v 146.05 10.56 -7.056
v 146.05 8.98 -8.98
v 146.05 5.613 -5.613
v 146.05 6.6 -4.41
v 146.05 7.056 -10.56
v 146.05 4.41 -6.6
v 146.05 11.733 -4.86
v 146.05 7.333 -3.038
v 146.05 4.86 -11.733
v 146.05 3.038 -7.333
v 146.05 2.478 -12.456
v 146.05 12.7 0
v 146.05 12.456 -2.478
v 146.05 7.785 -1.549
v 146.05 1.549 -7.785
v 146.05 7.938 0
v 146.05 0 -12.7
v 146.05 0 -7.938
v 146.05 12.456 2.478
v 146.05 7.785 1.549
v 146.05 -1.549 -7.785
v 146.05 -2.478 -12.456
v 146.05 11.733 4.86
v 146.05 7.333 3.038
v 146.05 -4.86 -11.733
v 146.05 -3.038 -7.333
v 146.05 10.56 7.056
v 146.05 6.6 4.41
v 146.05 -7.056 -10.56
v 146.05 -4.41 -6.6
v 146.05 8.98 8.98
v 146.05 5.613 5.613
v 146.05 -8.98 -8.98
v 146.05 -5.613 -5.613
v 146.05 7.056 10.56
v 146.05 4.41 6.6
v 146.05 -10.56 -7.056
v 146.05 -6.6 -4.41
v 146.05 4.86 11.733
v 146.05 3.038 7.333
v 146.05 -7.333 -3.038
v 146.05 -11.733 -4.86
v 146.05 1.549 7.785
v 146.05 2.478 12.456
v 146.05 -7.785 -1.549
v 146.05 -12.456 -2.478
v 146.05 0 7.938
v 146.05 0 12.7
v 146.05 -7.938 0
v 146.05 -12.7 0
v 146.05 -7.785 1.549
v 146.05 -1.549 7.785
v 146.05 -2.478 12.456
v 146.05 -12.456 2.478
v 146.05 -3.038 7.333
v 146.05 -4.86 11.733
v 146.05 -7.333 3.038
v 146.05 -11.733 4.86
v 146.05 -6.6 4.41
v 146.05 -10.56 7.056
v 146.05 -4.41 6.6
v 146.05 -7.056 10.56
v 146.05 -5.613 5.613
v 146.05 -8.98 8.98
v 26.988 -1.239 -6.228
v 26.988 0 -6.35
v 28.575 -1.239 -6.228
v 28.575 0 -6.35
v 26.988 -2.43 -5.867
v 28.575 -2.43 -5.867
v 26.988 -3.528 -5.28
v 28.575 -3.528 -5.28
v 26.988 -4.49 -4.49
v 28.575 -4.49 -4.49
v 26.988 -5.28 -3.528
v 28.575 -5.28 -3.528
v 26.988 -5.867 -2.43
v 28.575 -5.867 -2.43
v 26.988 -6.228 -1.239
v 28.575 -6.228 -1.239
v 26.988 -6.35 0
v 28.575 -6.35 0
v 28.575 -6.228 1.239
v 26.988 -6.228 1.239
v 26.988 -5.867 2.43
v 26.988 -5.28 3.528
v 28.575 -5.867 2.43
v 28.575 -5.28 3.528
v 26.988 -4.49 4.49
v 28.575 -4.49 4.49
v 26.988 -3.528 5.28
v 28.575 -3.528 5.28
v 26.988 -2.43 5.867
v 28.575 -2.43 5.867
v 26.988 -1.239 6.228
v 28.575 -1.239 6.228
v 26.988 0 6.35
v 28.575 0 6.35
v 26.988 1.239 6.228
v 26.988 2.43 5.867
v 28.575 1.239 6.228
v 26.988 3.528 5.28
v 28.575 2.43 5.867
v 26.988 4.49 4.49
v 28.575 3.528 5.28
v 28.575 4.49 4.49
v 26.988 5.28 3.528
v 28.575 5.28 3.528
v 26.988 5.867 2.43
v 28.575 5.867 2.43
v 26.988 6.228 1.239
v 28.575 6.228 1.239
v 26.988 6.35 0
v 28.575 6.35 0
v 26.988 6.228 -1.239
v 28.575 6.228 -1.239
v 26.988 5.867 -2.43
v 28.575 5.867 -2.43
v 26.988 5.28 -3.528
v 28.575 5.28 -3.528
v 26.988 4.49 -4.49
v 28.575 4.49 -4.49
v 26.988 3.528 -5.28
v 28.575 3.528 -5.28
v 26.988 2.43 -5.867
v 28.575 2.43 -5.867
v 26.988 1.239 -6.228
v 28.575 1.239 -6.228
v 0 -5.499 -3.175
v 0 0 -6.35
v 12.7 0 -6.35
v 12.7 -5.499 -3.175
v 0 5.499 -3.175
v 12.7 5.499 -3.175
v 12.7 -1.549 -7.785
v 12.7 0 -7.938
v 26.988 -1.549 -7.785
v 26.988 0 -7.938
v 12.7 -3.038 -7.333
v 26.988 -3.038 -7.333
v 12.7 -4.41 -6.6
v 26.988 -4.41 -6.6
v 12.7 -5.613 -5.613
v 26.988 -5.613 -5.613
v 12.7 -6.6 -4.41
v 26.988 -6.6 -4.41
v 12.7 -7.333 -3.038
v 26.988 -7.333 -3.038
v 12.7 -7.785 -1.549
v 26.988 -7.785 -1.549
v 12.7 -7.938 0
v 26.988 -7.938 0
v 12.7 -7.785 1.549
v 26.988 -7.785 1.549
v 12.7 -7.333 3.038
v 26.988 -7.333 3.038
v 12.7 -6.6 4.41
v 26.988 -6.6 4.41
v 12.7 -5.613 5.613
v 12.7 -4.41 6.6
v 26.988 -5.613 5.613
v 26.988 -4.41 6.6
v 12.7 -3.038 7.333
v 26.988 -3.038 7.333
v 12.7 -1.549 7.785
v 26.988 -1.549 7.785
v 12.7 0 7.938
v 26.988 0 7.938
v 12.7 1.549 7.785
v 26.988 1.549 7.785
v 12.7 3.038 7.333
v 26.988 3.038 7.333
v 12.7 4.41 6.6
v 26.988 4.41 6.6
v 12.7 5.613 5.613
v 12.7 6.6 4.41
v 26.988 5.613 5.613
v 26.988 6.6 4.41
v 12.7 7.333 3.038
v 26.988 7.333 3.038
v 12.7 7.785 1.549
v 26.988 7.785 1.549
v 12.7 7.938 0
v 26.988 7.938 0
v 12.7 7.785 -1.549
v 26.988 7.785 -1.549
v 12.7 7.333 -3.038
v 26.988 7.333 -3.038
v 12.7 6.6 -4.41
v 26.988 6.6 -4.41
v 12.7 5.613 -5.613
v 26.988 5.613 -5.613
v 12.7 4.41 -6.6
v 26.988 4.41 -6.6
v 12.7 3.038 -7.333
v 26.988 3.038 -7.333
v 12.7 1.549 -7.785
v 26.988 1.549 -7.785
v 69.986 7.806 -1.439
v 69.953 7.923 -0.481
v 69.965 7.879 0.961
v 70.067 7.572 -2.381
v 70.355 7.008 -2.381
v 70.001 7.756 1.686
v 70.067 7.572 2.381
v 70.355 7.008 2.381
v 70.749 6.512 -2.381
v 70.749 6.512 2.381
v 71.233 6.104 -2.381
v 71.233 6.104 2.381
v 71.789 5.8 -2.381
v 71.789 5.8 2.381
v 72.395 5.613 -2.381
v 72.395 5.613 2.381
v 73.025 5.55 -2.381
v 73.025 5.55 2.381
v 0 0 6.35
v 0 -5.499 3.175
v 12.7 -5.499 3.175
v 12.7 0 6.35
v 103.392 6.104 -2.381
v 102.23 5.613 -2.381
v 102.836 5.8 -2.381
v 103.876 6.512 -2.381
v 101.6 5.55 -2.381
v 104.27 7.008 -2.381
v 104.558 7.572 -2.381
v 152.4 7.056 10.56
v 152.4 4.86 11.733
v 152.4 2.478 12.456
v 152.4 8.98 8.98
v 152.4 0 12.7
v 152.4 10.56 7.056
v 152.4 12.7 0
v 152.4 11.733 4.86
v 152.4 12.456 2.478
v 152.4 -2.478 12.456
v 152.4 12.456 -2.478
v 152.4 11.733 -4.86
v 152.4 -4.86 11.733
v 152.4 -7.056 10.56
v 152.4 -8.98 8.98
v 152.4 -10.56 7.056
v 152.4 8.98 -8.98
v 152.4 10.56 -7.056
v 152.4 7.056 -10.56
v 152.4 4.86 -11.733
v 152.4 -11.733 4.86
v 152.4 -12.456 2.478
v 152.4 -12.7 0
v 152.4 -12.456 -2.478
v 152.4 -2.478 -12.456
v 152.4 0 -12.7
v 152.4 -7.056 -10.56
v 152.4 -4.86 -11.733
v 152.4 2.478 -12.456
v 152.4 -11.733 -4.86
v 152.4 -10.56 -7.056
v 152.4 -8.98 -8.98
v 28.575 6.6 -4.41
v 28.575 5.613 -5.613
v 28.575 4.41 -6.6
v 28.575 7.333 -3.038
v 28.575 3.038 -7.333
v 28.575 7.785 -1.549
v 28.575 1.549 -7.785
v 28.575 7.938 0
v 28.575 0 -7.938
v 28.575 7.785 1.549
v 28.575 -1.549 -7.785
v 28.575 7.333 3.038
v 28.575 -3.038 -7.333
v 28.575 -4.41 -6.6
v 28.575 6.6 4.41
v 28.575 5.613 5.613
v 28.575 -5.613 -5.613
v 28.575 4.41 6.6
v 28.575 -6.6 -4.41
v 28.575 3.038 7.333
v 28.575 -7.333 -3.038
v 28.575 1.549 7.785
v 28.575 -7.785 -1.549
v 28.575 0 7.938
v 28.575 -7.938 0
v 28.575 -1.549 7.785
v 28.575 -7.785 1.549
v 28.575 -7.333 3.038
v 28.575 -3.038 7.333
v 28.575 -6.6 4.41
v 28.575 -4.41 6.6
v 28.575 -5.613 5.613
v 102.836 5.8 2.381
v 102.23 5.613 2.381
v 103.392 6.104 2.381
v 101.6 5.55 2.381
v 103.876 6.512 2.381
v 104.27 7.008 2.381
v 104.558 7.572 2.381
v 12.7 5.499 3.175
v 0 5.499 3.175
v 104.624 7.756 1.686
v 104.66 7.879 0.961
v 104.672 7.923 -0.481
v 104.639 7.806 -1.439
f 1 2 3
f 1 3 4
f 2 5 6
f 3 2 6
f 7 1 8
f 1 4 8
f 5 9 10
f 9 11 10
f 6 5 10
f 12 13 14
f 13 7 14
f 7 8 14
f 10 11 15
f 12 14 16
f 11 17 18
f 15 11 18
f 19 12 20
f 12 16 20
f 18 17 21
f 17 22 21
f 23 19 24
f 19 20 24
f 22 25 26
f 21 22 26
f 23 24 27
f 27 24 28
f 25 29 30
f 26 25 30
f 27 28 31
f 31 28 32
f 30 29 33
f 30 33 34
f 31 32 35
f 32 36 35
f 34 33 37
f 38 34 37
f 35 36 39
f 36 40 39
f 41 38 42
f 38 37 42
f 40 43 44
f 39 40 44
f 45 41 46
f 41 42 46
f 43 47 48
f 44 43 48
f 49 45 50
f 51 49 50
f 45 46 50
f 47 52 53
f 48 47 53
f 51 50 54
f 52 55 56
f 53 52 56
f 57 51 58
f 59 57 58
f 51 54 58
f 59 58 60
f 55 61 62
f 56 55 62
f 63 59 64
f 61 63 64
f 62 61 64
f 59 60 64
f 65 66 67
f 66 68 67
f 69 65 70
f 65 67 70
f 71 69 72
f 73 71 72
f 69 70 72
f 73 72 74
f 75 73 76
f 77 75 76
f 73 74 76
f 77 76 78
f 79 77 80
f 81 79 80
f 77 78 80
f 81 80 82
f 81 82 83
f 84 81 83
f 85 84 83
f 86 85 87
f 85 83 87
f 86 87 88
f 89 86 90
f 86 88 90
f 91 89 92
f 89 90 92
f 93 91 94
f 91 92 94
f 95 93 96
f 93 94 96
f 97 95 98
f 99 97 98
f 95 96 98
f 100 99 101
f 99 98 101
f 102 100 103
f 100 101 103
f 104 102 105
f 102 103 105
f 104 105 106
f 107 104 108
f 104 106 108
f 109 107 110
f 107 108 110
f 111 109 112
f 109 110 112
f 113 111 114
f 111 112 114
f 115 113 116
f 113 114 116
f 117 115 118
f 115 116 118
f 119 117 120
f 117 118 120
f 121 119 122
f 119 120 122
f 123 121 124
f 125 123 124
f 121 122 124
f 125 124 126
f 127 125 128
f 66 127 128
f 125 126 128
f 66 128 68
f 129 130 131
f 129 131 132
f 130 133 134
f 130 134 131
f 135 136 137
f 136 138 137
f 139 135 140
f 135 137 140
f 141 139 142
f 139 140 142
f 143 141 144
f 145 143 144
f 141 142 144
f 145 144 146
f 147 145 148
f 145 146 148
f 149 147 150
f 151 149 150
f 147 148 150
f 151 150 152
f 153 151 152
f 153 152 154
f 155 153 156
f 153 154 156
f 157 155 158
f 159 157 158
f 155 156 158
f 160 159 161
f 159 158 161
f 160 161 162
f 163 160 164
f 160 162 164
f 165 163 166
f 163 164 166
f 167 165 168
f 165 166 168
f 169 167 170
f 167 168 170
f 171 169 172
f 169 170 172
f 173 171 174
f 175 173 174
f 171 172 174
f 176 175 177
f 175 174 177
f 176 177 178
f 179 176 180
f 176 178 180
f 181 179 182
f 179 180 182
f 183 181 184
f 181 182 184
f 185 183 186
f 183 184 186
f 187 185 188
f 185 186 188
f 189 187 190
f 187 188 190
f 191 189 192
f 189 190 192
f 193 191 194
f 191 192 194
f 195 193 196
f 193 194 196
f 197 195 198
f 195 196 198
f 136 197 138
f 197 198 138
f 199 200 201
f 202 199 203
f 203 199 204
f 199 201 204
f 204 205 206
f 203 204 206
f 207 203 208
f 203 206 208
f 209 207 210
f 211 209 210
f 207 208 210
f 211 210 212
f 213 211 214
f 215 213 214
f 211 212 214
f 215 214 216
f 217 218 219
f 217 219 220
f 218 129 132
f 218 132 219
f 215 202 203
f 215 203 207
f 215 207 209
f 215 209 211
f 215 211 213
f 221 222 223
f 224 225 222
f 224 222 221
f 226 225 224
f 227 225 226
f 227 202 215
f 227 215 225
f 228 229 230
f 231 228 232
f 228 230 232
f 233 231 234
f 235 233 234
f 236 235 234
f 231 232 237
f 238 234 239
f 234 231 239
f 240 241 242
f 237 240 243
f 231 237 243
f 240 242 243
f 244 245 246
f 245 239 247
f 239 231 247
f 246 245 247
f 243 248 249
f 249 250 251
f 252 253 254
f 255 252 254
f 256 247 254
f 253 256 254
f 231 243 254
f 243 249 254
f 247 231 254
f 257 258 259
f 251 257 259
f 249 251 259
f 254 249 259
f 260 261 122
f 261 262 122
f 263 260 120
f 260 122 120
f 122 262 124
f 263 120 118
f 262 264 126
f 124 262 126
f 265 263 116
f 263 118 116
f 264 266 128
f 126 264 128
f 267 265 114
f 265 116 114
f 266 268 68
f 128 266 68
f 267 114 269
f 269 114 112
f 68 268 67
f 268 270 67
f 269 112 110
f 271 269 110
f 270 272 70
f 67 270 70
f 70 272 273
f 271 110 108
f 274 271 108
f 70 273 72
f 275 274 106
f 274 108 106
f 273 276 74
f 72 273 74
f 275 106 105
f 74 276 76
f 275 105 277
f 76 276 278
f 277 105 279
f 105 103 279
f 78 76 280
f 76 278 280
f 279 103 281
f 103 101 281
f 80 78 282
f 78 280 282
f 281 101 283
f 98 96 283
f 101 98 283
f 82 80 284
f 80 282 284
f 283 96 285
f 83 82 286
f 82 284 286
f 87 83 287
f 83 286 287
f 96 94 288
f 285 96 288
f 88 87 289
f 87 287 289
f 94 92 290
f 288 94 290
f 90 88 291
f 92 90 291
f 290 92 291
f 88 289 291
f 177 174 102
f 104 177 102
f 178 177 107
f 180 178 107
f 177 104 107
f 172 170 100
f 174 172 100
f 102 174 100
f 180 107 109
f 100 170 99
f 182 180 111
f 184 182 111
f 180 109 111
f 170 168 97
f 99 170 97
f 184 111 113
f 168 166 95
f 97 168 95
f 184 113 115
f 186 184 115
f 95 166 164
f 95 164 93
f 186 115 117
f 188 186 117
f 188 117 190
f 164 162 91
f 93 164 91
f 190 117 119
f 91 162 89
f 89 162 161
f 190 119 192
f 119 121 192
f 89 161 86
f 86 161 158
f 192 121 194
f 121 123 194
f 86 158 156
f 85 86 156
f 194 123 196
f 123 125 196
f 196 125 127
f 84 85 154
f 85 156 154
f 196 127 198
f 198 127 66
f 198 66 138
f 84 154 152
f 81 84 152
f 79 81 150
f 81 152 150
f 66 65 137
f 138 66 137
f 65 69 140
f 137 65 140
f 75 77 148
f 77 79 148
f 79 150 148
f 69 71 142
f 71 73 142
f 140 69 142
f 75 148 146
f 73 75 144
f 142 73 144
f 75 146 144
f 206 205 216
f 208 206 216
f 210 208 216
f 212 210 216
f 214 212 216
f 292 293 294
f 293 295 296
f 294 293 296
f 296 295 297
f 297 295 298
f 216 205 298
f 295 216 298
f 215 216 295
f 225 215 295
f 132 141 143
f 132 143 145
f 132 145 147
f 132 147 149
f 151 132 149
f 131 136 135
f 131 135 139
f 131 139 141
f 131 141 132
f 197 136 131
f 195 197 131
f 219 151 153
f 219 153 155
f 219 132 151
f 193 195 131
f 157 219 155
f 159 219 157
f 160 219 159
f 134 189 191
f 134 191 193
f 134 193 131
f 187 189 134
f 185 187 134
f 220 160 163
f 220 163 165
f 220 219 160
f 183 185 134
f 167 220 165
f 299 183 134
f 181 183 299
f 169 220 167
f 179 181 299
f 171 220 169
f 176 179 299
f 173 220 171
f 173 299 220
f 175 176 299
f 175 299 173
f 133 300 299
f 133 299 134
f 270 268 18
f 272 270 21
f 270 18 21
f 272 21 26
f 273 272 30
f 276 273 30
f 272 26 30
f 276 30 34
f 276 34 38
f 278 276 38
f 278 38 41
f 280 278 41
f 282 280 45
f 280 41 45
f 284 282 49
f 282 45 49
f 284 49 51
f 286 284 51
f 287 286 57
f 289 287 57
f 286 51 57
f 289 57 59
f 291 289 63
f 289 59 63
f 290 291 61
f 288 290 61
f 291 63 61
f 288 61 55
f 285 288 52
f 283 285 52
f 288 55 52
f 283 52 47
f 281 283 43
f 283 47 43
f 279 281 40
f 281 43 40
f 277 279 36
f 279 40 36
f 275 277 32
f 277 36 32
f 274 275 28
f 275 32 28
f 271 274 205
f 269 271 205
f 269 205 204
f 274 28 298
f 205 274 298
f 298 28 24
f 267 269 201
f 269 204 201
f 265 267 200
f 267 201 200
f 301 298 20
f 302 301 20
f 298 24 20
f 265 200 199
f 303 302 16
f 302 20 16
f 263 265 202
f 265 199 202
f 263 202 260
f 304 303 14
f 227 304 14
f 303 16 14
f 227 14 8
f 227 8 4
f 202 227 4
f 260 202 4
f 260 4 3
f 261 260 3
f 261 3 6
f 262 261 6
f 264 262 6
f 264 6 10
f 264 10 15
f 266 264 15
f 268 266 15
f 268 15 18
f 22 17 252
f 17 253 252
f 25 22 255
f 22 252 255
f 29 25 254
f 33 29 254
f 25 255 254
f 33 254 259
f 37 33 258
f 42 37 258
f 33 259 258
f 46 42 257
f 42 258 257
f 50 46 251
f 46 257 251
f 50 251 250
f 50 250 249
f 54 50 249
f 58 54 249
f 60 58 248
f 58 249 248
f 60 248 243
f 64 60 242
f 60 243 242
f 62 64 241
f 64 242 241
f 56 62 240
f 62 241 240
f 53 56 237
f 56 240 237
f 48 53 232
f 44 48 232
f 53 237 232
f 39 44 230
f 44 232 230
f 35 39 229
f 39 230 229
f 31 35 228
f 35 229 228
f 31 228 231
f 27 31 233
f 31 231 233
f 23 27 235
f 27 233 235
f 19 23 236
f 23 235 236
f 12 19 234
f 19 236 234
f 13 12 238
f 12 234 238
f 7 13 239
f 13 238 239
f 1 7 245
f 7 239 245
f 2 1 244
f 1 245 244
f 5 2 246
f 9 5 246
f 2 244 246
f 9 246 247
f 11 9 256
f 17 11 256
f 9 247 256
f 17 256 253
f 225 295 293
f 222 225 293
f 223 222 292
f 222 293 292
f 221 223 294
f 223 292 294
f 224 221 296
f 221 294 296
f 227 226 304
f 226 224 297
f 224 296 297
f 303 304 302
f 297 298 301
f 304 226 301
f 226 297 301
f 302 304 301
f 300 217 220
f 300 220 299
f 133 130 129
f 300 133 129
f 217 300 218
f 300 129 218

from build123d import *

# Parameters (mm, degrees)
KEYWAY_DEPTH       = 2.38125
SKETCH3_OUTSIDE_W  = 58.716
SKETCH3_OUTSIDE_H  = 58.716
CUT_EXTRUDE2_DEPTH = 12.7


with BuildPart() as part:
    # Sketch1 → Base (revolve)
    with BuildSketch(Plane.XY, mode=Mode.PRIVATE) as base_sk:
        Polygon((0, 0), (0, 6.35), (12.7, 6.35), (12.7, 7.9375), (26.9875, 7.9375), (26.9875, 6.35), (28.575, 6.35), (28.575, 7.9375), (146.05, 7.9375), (146.05, 12.7), (152.4, 12.7), (152.4, 0), align=None)
    revolve(base_sk.sketch.rotate(Axis((0, 0, 0), (-1, 0, 0)), 90), axis=Axis((0, 0, 0), (-1, 0, 0)))

    # Sketch2 → Keyway (cut, symmetric)
    with BuildSketch(Plane.XY):
        with BuildLine():
            Line((69.85, 14.2875), (69.85, 8.7249))
            ThreePointArc((69.85, 8.7249), (70.77993597, 6.47983597), (73.025, 5.5499))
            Line((73.025, 5.5499), (101.6, 5.5499))
            ThreePointArc((101.6, 5.5499), (103.84506403, 6.47983597), (104.775, 8.7249))
            Line((104.775, 8.7249), (104.775, 14.2875))
            Line((104.775, 14.2875), (69.85, 14.2875))
        make_face()
    extrude(amount=KEYWAY_DEPTH, both=True, mode=Mode.SUBTRACT)

    # Sketch3 outside → Cut-Extrude2 (cut)
    with BuildSketch(Plane.ZY):
        Rectangle(SKETCH3_OUTSIDE_W, SKETCH3_OUTSIDE_H)
        Polygon((3.175, 5.499261314), (-3.175, 5.499261314), (-6.35, 0), (-3.175, -5.499261314), (3.175, -5.499261314), (6.35, 0), align=None, mode=Mode.SUBTRACT)
    extrude(amount=-CUT_EXTRUDE2_DEPTH, mode=Mode.SUBTRACT)


solid = part.part
